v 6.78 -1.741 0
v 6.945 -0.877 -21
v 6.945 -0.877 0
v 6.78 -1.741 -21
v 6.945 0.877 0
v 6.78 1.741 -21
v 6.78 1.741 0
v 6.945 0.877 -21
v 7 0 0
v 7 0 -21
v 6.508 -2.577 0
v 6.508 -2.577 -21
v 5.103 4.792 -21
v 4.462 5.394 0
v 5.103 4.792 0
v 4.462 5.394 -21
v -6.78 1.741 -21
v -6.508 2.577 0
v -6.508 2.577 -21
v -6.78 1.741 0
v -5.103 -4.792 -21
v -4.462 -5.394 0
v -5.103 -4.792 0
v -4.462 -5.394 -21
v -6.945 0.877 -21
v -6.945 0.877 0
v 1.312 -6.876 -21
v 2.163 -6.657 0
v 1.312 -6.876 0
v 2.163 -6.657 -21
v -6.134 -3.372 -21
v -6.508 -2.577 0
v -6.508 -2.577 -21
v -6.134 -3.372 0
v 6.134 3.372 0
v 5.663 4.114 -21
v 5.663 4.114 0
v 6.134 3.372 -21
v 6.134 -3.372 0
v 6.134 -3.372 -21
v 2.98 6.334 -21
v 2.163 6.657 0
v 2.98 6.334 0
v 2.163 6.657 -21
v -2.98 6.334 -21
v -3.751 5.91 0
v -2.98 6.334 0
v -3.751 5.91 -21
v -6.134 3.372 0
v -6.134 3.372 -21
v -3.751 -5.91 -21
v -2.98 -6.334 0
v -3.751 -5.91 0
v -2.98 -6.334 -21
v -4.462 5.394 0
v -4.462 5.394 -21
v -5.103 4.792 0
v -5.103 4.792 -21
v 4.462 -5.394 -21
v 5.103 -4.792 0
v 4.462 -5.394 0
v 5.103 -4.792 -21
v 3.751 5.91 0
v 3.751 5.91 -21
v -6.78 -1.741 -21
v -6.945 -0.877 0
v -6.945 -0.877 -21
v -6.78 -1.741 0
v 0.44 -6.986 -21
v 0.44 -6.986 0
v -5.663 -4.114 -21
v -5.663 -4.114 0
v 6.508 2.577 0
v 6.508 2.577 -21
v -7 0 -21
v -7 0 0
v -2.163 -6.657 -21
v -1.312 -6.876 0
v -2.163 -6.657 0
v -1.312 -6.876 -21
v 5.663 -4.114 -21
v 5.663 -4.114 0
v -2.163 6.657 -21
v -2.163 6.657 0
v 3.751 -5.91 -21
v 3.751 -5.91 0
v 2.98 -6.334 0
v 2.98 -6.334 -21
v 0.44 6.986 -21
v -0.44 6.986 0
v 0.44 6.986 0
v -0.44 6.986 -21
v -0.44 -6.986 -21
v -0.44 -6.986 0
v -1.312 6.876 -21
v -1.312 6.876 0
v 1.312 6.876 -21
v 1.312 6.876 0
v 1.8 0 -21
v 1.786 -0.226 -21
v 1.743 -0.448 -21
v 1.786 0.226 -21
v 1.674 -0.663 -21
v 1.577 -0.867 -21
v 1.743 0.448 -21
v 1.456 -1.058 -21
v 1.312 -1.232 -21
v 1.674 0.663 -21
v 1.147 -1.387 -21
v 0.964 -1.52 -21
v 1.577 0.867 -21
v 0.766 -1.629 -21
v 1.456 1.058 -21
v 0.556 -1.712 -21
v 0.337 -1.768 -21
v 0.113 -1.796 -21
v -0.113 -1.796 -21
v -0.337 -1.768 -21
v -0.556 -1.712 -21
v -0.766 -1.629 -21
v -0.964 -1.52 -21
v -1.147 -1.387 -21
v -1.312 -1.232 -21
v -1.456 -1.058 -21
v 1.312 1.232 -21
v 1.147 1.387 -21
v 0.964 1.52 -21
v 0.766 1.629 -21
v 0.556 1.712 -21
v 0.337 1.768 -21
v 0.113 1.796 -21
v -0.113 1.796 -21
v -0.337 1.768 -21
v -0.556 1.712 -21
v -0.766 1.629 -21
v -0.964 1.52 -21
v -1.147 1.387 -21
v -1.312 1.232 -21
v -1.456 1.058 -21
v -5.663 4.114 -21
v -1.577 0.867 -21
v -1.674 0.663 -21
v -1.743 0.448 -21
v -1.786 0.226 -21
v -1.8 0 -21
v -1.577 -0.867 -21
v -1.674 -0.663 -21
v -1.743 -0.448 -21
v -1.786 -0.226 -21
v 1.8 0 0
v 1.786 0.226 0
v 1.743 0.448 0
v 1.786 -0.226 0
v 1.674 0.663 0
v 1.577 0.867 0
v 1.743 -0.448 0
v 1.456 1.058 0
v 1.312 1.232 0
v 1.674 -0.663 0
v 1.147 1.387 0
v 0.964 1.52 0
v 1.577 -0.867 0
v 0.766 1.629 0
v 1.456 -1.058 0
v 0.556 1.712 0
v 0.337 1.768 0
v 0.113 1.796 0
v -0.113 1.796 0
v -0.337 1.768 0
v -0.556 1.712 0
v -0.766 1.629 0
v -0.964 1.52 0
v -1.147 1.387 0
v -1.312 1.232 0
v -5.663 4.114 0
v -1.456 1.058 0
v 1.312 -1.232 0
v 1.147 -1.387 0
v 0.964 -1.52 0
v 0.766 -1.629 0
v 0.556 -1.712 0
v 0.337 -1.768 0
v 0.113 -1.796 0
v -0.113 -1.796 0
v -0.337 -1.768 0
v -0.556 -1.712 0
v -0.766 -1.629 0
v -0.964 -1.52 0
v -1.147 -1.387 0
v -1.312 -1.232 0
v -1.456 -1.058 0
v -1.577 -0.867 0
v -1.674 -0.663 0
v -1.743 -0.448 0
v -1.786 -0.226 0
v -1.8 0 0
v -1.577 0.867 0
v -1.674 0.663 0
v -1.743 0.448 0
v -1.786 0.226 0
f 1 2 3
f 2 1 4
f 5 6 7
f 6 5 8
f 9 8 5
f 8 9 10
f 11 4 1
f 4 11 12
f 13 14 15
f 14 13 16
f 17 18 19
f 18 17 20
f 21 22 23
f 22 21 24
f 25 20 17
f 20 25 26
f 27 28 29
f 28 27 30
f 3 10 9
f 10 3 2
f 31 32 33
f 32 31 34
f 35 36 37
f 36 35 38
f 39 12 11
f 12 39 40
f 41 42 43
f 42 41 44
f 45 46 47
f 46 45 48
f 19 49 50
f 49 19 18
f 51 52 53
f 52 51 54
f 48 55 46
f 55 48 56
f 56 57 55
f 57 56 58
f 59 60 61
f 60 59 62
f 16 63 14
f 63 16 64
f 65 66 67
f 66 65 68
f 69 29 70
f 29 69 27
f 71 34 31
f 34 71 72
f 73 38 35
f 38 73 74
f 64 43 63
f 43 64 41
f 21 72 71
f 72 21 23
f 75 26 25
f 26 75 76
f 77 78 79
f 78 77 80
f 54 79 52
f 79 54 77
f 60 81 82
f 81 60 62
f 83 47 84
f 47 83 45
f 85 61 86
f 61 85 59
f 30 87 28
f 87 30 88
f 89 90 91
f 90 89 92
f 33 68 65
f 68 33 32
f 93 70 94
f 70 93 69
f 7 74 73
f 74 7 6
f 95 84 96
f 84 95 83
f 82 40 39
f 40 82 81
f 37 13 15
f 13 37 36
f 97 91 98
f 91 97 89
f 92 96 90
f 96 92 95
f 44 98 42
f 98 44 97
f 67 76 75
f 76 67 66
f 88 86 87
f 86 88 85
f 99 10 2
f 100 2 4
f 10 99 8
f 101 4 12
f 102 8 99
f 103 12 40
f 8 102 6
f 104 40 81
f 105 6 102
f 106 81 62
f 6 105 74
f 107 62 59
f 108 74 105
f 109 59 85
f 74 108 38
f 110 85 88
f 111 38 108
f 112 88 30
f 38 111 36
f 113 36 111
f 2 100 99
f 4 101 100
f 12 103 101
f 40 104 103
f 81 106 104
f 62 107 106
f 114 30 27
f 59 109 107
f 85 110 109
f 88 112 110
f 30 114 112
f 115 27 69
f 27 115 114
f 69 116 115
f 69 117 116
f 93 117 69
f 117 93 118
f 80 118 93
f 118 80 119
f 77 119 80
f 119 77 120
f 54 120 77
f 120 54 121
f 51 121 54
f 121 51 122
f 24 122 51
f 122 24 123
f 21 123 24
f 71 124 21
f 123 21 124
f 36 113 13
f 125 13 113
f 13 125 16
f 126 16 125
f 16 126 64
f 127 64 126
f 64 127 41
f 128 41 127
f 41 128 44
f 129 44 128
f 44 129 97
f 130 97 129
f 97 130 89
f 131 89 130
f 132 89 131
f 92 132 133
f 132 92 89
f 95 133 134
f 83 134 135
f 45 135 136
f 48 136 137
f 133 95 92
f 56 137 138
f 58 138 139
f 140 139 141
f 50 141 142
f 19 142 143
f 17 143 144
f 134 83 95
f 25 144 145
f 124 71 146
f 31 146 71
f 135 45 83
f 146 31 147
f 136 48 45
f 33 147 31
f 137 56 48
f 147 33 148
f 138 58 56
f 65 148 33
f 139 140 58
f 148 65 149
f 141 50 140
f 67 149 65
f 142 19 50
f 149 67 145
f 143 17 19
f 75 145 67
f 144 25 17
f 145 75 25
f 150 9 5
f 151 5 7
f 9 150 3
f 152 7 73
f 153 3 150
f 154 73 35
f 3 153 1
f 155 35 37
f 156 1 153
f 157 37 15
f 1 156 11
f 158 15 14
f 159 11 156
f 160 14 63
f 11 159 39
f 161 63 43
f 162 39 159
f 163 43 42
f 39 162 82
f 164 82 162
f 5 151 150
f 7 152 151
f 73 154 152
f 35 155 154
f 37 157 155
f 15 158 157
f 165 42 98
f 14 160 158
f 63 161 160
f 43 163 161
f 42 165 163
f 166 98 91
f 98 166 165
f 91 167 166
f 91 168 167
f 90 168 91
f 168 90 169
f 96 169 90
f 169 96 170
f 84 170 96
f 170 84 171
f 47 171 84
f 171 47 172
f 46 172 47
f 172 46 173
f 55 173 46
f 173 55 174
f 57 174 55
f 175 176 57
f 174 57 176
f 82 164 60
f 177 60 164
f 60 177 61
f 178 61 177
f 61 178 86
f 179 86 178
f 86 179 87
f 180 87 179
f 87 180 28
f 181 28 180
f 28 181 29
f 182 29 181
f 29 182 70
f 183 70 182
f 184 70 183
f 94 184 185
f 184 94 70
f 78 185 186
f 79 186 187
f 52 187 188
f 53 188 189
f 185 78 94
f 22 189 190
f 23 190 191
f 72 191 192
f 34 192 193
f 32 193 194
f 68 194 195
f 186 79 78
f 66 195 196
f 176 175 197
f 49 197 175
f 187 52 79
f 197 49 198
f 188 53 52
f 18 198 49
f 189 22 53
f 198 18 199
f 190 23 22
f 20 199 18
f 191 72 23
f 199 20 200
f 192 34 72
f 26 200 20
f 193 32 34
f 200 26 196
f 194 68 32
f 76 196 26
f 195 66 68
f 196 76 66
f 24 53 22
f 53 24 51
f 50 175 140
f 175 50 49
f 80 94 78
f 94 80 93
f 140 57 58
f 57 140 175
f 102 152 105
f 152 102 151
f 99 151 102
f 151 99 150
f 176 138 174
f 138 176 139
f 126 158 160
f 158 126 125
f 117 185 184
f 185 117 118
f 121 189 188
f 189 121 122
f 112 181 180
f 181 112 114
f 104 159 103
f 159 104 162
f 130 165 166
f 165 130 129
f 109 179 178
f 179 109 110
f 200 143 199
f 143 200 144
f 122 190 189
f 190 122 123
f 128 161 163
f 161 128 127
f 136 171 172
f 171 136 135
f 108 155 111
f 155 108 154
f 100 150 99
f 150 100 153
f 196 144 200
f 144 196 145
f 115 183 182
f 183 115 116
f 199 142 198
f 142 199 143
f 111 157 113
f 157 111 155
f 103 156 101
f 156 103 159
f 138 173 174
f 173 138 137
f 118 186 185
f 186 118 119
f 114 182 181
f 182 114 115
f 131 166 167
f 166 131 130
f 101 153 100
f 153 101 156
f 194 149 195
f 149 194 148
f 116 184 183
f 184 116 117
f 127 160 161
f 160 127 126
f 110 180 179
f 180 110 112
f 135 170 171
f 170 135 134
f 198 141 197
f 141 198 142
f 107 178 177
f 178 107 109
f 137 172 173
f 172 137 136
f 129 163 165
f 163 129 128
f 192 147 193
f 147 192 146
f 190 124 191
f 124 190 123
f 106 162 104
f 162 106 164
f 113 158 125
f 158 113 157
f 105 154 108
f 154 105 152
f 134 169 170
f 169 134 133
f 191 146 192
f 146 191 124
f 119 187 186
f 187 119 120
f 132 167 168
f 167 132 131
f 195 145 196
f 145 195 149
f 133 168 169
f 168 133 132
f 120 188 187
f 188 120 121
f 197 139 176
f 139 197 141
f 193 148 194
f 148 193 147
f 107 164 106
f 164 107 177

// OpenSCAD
$fn = 50;


difference() {
	union() {
		translate(v = [0, 0, -21.0000000000]) {
			cylinder(h = 21, r = 7.0000000000);
		}
		cylinder(h = 0, r = 17.0000000000);
	}
	union() {
		#translate(v = [0, 0, -21]) {
			cylinder(h = 21, r = 1.8000000000);
		}
	}
}
